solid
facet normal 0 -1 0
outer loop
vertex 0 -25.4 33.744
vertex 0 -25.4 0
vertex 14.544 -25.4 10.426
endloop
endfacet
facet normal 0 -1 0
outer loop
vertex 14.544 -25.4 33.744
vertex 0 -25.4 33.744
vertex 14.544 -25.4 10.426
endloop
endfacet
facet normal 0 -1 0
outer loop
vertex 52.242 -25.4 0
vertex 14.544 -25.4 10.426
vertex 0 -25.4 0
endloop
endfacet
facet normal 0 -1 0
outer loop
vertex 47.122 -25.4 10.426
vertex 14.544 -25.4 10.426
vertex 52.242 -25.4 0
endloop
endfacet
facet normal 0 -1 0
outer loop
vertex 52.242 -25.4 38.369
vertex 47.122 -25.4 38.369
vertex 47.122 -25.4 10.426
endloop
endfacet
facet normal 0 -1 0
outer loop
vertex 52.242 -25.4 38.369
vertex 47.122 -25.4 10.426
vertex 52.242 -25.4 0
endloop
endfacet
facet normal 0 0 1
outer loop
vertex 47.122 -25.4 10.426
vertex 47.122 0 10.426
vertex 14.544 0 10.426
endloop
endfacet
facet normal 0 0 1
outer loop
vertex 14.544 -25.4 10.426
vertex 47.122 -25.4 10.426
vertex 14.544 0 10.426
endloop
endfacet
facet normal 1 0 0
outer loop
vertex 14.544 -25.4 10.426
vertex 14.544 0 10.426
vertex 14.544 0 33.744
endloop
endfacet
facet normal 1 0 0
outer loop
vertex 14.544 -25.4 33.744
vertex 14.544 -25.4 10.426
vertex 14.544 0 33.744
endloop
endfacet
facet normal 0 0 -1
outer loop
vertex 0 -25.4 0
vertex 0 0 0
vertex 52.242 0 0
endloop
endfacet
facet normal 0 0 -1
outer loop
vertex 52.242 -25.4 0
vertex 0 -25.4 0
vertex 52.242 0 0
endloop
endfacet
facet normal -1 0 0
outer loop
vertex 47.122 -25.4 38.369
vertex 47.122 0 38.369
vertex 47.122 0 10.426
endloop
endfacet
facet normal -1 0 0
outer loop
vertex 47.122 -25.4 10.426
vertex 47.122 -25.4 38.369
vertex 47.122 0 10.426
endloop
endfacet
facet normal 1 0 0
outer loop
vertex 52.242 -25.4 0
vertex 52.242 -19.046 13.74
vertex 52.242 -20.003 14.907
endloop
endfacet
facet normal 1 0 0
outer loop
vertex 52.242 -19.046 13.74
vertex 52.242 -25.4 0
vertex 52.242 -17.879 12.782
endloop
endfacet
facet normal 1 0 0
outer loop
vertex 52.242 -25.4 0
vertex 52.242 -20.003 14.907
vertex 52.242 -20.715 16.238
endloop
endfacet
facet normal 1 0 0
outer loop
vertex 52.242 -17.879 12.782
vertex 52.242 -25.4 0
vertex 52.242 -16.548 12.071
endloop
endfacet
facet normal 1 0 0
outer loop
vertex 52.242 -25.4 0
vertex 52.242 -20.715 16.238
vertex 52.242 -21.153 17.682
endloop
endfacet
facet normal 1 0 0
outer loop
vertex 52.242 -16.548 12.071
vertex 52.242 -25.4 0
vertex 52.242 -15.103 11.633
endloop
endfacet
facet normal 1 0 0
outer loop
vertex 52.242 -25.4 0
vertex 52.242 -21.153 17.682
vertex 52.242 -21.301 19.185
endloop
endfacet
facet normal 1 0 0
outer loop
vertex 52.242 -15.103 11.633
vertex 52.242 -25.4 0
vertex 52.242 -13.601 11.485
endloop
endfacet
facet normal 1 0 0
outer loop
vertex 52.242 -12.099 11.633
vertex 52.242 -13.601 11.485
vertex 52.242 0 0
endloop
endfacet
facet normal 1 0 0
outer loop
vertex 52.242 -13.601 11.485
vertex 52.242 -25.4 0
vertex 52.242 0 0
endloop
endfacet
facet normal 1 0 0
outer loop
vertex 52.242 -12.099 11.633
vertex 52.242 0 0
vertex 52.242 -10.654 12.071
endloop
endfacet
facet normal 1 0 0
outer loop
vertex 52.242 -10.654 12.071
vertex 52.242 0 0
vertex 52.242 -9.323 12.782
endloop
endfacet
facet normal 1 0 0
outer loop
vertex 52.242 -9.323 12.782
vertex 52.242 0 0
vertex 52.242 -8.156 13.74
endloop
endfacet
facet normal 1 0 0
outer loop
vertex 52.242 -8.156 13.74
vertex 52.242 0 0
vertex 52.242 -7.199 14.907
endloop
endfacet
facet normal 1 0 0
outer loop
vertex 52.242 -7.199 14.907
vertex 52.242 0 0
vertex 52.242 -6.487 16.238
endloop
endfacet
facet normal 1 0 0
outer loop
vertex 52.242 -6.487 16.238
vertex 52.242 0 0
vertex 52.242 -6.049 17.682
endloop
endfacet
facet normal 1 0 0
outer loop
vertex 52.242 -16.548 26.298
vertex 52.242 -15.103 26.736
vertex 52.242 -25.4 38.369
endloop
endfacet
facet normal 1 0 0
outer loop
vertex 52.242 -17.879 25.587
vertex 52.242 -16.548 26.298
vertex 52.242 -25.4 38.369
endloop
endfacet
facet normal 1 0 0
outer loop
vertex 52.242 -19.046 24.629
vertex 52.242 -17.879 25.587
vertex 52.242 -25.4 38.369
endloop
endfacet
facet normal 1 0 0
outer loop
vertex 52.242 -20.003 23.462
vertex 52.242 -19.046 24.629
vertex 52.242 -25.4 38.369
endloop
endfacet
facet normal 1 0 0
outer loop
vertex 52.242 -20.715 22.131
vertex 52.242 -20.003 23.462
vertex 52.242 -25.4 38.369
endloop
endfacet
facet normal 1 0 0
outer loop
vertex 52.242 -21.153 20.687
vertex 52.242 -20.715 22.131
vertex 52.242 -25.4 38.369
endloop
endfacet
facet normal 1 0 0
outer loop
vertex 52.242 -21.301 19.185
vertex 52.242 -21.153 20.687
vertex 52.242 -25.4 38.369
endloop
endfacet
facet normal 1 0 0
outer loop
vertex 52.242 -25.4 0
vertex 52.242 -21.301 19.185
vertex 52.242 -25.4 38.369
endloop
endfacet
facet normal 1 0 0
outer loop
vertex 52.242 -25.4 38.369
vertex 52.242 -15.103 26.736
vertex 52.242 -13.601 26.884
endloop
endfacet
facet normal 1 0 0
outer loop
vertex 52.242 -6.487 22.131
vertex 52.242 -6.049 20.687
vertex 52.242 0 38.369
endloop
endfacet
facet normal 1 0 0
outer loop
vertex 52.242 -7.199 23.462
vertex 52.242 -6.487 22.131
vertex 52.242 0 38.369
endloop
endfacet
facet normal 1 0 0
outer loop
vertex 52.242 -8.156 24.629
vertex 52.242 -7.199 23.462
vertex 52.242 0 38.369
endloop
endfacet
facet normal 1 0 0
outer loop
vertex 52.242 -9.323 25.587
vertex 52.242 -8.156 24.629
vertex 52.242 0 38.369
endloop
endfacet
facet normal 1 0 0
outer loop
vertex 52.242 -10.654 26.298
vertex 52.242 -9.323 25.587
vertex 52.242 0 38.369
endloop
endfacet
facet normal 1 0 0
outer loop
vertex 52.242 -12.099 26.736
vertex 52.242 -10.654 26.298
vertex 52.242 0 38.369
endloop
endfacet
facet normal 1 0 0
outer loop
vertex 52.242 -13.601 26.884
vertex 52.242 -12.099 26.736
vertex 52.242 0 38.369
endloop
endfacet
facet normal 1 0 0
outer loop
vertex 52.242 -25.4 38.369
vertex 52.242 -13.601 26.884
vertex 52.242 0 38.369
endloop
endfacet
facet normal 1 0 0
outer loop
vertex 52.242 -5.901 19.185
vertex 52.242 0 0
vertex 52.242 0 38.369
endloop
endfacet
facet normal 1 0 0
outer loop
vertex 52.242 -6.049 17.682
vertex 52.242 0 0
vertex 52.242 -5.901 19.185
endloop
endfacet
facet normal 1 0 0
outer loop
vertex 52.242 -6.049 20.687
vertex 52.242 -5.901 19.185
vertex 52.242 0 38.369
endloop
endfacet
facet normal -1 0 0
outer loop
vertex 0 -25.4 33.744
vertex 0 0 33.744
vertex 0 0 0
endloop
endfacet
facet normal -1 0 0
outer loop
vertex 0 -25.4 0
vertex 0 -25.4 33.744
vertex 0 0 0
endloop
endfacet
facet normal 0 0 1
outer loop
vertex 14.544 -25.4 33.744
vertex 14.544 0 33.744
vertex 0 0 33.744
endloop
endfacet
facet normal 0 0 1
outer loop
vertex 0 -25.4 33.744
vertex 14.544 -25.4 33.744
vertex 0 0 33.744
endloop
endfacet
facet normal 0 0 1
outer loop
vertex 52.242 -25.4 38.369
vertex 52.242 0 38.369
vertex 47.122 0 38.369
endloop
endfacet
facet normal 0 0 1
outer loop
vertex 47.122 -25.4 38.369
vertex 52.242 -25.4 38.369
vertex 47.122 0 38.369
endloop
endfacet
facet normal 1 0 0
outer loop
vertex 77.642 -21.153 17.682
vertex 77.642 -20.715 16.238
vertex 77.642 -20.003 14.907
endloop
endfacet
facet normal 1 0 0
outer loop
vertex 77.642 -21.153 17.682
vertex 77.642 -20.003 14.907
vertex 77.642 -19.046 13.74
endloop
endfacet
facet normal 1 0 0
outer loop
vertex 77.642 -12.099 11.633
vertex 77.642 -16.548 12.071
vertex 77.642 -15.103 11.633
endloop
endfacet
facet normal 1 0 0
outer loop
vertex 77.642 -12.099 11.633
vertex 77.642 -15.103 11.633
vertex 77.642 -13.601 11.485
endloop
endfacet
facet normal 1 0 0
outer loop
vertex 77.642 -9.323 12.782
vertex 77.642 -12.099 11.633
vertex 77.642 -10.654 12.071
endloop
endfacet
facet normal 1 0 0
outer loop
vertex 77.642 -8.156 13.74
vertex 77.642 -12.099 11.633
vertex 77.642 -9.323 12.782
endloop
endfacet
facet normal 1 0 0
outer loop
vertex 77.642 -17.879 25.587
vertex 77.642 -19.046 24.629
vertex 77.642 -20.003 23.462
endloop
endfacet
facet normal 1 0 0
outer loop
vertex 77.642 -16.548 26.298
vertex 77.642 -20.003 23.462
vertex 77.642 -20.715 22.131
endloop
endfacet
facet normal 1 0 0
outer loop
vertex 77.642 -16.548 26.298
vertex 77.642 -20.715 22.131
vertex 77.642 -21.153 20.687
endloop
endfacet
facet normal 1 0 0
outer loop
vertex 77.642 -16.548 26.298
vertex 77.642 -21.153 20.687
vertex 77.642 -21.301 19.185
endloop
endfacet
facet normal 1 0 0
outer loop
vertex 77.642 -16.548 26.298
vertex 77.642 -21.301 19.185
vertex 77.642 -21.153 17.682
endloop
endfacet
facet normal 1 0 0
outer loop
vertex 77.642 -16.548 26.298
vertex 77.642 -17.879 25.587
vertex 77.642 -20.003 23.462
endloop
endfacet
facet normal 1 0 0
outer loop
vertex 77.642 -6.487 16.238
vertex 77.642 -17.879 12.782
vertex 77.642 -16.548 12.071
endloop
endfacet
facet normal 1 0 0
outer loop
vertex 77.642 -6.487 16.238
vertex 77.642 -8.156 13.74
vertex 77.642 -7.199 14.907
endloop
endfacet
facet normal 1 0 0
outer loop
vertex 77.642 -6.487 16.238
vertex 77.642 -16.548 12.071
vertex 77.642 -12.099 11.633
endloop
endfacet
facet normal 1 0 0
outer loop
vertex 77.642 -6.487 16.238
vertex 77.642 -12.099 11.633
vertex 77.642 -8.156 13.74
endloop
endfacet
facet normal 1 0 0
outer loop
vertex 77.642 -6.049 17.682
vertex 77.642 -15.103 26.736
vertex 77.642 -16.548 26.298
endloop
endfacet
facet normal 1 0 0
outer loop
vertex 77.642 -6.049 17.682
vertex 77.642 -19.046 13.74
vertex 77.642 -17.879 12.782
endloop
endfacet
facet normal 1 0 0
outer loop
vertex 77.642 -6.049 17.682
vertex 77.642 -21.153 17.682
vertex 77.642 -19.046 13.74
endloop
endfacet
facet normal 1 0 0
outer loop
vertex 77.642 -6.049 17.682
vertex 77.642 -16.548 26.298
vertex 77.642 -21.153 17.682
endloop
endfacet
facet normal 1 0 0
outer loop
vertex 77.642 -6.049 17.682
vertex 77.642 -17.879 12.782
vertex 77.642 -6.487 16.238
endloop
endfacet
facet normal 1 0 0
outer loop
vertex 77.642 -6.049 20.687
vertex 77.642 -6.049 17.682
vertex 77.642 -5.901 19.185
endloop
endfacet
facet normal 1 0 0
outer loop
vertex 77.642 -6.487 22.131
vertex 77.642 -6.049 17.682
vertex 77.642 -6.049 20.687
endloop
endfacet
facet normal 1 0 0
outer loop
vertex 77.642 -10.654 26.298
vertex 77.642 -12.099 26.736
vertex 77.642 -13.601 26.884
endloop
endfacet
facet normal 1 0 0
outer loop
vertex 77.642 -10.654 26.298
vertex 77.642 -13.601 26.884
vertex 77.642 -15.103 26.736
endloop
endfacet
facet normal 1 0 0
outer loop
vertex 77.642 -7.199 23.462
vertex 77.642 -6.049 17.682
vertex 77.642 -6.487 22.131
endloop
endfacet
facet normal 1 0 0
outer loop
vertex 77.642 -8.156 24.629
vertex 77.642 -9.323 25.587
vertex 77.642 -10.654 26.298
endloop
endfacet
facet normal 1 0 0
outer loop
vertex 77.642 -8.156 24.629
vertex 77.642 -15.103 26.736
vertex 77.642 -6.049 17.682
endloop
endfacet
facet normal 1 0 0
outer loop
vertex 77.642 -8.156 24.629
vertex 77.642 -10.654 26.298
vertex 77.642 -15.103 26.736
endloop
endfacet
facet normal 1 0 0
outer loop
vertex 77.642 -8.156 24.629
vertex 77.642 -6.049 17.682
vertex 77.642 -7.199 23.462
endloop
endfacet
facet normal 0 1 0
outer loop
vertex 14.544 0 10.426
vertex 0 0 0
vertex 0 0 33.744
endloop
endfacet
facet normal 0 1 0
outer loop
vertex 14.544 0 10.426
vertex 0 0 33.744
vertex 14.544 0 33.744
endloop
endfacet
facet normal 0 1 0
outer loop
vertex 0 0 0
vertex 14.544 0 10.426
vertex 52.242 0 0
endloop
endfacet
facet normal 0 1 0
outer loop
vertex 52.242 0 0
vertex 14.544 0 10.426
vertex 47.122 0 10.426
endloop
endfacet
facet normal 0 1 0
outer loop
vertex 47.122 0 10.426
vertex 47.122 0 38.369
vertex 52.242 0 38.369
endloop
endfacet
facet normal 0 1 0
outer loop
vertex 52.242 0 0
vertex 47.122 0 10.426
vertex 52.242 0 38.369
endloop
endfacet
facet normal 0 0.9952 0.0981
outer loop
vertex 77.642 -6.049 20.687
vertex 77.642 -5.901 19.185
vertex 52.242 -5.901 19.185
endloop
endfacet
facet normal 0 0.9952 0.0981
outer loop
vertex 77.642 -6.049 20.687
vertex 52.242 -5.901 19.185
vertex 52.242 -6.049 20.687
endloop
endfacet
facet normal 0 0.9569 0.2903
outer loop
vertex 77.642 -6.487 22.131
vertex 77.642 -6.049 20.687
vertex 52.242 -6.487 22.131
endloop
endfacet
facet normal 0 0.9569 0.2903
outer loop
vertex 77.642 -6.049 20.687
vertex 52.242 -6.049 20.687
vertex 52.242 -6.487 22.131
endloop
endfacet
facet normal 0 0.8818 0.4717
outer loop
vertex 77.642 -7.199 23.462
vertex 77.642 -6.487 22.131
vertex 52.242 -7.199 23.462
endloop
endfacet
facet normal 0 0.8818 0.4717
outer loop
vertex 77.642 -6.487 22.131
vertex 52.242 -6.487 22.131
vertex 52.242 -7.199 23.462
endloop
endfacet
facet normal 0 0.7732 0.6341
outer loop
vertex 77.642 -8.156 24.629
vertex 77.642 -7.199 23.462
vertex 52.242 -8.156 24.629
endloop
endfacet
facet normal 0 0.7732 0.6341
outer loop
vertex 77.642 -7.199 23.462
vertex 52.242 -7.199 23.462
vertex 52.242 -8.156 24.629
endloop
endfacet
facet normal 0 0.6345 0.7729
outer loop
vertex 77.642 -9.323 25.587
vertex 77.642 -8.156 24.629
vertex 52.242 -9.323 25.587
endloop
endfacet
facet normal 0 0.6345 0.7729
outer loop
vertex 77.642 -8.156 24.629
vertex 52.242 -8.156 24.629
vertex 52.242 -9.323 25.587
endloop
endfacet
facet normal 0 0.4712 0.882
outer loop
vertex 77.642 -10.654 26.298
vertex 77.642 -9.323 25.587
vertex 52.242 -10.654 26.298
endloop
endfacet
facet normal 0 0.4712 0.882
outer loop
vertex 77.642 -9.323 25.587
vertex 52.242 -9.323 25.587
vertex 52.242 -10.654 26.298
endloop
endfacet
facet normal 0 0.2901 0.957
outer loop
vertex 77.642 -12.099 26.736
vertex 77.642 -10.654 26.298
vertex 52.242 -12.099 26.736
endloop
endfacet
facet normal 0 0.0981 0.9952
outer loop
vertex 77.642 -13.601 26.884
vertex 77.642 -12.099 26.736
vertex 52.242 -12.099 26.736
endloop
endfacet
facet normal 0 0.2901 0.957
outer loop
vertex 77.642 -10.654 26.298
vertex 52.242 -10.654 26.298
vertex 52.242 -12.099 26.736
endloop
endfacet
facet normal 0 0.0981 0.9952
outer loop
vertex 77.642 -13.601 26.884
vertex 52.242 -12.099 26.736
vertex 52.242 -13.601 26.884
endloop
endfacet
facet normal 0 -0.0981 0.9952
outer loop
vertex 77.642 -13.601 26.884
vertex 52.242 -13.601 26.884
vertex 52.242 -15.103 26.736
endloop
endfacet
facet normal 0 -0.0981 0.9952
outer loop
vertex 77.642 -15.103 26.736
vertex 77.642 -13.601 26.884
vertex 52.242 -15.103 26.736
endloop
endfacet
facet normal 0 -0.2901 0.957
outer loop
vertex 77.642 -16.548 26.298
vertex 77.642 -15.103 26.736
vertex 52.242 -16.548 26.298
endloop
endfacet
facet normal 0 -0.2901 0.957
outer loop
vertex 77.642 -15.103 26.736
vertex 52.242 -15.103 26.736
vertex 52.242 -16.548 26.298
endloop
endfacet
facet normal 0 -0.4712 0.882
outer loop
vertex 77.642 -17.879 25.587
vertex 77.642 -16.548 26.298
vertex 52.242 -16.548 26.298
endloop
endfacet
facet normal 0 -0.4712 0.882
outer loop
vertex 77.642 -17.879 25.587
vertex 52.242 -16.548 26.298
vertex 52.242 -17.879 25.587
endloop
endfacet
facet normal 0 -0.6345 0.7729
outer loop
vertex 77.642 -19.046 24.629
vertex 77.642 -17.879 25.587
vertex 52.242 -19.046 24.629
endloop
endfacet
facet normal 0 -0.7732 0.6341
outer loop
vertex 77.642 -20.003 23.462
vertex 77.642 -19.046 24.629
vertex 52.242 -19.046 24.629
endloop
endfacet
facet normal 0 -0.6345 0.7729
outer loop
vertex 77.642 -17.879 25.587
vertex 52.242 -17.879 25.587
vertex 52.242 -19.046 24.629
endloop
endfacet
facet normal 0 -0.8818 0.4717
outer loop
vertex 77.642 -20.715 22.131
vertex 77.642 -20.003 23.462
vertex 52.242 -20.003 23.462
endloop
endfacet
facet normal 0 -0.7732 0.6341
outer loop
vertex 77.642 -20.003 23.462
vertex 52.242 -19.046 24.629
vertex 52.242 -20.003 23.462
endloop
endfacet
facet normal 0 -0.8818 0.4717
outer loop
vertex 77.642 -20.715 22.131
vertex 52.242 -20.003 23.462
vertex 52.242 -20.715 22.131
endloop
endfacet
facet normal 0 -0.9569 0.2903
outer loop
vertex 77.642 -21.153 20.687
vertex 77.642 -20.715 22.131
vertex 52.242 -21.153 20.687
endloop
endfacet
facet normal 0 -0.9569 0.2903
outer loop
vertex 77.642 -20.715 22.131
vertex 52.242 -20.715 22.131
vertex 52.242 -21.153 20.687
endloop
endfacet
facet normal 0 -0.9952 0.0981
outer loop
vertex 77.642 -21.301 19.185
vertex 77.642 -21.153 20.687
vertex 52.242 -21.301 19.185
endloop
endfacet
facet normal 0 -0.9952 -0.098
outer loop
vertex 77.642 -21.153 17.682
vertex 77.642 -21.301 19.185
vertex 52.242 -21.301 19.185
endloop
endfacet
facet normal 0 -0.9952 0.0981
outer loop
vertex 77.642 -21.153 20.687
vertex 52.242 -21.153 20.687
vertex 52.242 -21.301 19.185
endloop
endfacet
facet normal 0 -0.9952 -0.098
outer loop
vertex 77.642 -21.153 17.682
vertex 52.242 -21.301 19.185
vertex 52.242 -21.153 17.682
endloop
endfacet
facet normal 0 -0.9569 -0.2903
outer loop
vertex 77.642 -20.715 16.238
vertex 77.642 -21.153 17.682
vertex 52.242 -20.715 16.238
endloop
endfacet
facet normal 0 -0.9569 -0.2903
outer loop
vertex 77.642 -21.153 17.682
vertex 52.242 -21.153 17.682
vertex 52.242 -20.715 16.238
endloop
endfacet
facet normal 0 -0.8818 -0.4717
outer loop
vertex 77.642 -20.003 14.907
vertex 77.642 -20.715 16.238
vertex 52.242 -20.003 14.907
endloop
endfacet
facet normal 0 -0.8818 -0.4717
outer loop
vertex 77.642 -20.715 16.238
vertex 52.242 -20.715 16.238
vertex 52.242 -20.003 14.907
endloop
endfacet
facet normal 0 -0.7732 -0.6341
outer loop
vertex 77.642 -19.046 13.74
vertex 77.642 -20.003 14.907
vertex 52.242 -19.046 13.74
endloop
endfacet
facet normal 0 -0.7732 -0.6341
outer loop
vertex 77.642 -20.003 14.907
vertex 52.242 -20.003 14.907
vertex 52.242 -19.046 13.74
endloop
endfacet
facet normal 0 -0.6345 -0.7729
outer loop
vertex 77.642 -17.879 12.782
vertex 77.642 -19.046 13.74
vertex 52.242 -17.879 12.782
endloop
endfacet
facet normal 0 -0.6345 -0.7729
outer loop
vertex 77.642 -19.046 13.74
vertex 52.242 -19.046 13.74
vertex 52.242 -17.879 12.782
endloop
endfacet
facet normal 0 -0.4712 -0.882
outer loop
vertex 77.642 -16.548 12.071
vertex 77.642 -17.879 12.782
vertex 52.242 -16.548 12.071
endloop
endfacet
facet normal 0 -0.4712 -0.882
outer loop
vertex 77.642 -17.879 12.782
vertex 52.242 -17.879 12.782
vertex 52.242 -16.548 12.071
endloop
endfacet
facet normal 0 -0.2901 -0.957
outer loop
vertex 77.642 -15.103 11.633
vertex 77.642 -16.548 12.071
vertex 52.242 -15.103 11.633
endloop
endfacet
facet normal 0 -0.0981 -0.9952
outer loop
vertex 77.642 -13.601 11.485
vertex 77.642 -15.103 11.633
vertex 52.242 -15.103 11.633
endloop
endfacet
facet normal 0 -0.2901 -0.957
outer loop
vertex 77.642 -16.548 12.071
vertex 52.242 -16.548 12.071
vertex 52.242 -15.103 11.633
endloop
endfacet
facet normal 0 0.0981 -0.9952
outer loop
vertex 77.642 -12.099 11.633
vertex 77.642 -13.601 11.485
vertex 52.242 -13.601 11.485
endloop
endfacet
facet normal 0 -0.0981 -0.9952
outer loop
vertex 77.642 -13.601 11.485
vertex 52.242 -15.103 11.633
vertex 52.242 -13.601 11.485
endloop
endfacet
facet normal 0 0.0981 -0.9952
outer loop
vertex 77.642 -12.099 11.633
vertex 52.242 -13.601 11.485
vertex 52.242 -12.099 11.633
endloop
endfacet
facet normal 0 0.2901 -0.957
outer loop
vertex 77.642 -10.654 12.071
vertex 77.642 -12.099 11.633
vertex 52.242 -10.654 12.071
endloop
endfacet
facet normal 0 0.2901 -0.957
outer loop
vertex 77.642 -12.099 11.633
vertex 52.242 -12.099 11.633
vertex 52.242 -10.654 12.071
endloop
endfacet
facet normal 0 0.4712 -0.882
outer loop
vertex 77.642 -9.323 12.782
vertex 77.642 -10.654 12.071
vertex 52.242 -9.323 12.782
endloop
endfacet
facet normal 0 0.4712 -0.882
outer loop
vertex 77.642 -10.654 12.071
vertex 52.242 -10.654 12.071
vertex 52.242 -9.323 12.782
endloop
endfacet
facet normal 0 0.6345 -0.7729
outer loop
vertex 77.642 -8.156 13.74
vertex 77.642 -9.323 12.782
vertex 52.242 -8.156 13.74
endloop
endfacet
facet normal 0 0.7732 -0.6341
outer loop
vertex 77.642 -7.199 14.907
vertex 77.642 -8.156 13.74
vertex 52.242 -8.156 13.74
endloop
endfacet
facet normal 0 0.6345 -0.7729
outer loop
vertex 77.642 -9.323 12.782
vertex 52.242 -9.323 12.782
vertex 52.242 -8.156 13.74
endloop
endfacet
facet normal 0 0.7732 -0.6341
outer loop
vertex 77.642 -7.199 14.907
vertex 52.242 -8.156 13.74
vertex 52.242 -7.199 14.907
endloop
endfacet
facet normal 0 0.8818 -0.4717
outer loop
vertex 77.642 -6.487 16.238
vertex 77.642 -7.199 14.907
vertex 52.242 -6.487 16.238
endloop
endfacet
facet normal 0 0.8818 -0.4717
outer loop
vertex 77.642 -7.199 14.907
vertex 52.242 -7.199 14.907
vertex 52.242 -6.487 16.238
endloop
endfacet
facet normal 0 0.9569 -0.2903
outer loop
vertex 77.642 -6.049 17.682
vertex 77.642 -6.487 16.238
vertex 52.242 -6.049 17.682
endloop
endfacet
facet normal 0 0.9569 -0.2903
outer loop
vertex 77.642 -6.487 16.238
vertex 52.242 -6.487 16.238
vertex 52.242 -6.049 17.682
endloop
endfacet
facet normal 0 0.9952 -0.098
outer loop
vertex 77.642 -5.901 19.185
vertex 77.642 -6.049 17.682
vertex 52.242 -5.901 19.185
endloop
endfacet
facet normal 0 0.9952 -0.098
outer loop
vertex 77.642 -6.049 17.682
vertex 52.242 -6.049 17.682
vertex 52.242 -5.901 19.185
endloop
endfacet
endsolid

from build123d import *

# Parameters (mm, degrees)
F1_DEPTH = 25.4
F2_R     = 7.699785
F3_DEPTH = 25.4


with BuildPart() as f1:
    # F0 (on Front) → F1 (new body)
    with BuildSketch(Plane.XZ):
        Polygon((0, 33.744156), (0, 0), (52.241661, 0), (52.241661, 38.369093), (47.122207, 38.369093), (47.122207, 10.425531), (14.543891, 10.425531), (14.543891, 33.744156), align=None)
    extrude(amount=F1_DEPTH)

    # F2 (on face) → F3 (join)
    with BuildSketch(Plane.YZ.offset(52.241661)):
        with Locations((-13.601066, 19.184543)):
            Circle(F2_R)
    extrude(amount=F3_DEPTH)


solid = f1.part
